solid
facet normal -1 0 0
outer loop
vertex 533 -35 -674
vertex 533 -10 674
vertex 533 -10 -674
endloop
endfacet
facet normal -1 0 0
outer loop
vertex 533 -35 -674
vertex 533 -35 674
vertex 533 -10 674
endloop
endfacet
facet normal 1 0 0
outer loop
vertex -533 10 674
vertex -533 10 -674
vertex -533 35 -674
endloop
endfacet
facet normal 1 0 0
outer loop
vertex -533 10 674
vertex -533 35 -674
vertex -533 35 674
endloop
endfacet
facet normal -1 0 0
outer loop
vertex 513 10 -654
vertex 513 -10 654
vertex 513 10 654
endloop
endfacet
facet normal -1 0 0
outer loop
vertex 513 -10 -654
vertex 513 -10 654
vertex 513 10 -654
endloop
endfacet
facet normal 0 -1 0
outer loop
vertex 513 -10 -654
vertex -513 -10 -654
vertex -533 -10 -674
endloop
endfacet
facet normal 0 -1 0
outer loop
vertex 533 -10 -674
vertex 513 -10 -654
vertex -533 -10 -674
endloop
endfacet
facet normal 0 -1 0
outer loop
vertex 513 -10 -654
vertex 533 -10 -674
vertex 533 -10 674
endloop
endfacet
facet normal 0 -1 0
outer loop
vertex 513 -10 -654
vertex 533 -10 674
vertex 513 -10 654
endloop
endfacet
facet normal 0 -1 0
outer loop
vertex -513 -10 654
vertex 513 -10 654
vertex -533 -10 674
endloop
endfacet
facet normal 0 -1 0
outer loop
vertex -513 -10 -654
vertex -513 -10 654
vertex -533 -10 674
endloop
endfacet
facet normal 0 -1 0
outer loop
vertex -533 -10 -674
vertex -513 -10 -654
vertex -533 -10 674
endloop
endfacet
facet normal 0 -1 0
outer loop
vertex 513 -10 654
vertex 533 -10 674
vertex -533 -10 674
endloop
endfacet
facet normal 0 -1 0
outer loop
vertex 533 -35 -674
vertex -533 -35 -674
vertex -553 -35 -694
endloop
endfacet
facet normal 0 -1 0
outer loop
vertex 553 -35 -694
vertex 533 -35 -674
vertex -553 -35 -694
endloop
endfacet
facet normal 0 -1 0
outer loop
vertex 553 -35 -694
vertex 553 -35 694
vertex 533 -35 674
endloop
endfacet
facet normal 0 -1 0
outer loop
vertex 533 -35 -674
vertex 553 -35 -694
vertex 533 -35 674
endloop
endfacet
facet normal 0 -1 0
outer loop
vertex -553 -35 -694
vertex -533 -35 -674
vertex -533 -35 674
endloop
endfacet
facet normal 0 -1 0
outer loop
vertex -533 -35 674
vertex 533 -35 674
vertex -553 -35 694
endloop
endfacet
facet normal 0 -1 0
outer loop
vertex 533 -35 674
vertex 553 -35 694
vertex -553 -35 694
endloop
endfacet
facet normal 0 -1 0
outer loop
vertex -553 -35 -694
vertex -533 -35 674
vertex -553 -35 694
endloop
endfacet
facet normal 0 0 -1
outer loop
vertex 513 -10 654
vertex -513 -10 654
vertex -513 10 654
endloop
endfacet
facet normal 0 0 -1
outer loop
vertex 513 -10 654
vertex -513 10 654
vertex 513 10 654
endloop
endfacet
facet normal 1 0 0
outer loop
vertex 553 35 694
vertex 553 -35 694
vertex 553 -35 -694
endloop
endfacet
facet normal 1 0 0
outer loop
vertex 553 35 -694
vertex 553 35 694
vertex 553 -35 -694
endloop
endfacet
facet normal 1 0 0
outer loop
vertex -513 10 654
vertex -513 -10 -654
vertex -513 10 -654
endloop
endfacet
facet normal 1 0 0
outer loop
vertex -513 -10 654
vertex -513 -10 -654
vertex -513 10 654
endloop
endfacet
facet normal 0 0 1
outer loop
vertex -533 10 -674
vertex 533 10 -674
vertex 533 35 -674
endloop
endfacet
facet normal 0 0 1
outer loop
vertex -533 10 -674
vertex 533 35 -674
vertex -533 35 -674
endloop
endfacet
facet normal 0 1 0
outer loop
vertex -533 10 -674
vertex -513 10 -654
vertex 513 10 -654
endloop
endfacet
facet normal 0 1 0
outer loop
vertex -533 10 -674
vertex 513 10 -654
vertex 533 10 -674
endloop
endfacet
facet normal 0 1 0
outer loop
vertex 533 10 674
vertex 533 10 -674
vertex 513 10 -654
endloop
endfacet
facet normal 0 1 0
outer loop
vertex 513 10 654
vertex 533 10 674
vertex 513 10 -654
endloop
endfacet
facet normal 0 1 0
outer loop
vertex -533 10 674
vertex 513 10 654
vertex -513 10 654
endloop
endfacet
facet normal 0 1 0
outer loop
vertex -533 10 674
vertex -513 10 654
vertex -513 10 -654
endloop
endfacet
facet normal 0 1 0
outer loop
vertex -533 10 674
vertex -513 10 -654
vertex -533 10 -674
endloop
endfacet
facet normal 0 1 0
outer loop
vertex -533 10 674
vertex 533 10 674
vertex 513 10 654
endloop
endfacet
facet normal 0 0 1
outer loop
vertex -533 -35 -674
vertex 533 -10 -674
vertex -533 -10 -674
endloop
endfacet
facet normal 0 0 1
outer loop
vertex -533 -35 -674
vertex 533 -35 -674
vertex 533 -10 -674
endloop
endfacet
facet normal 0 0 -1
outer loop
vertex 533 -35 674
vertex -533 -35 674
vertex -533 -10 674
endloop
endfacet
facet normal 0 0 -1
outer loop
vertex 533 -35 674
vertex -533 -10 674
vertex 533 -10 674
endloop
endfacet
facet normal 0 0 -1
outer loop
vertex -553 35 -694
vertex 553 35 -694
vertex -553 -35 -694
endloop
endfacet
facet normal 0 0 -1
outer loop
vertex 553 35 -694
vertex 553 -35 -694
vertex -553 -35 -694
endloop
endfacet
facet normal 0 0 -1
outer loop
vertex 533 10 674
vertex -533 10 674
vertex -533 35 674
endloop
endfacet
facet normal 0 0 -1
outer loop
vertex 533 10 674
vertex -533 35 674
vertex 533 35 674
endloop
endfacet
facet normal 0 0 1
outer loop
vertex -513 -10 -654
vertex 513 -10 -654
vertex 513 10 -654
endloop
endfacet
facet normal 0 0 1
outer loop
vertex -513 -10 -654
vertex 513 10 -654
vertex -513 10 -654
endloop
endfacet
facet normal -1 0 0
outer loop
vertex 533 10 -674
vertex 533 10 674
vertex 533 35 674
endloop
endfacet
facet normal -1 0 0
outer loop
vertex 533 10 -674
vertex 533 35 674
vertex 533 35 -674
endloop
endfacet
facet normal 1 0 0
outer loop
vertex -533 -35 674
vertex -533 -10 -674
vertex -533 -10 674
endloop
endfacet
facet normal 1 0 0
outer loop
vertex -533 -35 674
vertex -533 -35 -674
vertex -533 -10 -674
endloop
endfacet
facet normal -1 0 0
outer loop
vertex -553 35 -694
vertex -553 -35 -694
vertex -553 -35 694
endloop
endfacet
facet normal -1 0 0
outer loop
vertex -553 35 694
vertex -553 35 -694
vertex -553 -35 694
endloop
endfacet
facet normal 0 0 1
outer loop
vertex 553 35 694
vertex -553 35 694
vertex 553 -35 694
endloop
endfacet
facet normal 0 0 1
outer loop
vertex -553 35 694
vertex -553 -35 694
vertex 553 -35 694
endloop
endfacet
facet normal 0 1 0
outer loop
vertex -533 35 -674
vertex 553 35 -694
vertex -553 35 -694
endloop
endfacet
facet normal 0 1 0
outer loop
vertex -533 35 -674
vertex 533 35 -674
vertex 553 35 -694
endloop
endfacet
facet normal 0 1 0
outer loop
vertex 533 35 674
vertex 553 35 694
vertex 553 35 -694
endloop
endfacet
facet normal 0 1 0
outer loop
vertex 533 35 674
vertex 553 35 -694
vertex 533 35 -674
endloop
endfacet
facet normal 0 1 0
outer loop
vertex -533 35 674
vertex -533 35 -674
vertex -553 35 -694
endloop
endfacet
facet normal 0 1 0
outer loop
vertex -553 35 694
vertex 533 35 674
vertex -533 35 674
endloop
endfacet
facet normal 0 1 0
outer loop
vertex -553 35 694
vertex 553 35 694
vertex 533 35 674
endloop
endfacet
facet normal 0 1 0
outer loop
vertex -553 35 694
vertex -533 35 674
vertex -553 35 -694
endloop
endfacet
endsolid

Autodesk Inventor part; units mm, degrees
ref_plane "YZ Plane" through (0, 0, 0) normal (1, 0, 0) x (0, 1, 0)
ref_plane "XZ Plane" through (0, 0, 0) normal (0, 1, 0) x (-1, 0, 0)
ref_plane "XY Plane" through (0, 0, 0) normal (0, 0, 1) x (1, 0, 0)
sketch "Sketch1" plane through (0, 0, 0) normal (0, 1, 0) x (-1, 0, 0)
  line L0 (533, 674) -> (-533, 674)
  line L1 (-533, 674) -> (-533, -674)
  line L2 (-533, -674) -> (533, -674)
  line L3 (533, -674) -> (533, 674)
  line L4 (533, 674) -> (-533, -674) construction
  line L5 (-533, 674) -> (533, -674) construction
  line L6 (553, 694) -> (-553, 694)
  line L7 (-553, 694) -> (-553, -694)
  line L8 (-553, -694) -> (553, -694)
  line L9 (553, -694) -> (553, 694)
  line L10 (553, 694) -> (-553, -694) construction
  line L11 (-553, 694) -> (553, -694) construction
  line L12 (513, 654) -> (-513, 654)
  line L13 (-513, 654) -> (-513, -654)
  line L14 (-513, -654) -> (513, -654)
  line L15 (513, -654) -> (513, 654)
  line L16 (513, 654) -> (-513, -654) construction
  line L17 (-513, 654) -> (513, -654) construction
  point P0 (0, 0)
  dimension "d0" = 1066
  dimension "d1" = 1348
  dimension "d2" = 1106
  dimension "d3" = 1388
  dimension "d4" = 1026
  dimension "d5" = 1308
extrude "Extrusion2" add sketch "Sketch1" along normal mid plane 20 contours L3 L2 L1 L0
extrude "Extrusion3" add sketch "Sketch1" along normal mid plane 70 contours L9 L8 L7 L6
properties part number "solar panels holder"
